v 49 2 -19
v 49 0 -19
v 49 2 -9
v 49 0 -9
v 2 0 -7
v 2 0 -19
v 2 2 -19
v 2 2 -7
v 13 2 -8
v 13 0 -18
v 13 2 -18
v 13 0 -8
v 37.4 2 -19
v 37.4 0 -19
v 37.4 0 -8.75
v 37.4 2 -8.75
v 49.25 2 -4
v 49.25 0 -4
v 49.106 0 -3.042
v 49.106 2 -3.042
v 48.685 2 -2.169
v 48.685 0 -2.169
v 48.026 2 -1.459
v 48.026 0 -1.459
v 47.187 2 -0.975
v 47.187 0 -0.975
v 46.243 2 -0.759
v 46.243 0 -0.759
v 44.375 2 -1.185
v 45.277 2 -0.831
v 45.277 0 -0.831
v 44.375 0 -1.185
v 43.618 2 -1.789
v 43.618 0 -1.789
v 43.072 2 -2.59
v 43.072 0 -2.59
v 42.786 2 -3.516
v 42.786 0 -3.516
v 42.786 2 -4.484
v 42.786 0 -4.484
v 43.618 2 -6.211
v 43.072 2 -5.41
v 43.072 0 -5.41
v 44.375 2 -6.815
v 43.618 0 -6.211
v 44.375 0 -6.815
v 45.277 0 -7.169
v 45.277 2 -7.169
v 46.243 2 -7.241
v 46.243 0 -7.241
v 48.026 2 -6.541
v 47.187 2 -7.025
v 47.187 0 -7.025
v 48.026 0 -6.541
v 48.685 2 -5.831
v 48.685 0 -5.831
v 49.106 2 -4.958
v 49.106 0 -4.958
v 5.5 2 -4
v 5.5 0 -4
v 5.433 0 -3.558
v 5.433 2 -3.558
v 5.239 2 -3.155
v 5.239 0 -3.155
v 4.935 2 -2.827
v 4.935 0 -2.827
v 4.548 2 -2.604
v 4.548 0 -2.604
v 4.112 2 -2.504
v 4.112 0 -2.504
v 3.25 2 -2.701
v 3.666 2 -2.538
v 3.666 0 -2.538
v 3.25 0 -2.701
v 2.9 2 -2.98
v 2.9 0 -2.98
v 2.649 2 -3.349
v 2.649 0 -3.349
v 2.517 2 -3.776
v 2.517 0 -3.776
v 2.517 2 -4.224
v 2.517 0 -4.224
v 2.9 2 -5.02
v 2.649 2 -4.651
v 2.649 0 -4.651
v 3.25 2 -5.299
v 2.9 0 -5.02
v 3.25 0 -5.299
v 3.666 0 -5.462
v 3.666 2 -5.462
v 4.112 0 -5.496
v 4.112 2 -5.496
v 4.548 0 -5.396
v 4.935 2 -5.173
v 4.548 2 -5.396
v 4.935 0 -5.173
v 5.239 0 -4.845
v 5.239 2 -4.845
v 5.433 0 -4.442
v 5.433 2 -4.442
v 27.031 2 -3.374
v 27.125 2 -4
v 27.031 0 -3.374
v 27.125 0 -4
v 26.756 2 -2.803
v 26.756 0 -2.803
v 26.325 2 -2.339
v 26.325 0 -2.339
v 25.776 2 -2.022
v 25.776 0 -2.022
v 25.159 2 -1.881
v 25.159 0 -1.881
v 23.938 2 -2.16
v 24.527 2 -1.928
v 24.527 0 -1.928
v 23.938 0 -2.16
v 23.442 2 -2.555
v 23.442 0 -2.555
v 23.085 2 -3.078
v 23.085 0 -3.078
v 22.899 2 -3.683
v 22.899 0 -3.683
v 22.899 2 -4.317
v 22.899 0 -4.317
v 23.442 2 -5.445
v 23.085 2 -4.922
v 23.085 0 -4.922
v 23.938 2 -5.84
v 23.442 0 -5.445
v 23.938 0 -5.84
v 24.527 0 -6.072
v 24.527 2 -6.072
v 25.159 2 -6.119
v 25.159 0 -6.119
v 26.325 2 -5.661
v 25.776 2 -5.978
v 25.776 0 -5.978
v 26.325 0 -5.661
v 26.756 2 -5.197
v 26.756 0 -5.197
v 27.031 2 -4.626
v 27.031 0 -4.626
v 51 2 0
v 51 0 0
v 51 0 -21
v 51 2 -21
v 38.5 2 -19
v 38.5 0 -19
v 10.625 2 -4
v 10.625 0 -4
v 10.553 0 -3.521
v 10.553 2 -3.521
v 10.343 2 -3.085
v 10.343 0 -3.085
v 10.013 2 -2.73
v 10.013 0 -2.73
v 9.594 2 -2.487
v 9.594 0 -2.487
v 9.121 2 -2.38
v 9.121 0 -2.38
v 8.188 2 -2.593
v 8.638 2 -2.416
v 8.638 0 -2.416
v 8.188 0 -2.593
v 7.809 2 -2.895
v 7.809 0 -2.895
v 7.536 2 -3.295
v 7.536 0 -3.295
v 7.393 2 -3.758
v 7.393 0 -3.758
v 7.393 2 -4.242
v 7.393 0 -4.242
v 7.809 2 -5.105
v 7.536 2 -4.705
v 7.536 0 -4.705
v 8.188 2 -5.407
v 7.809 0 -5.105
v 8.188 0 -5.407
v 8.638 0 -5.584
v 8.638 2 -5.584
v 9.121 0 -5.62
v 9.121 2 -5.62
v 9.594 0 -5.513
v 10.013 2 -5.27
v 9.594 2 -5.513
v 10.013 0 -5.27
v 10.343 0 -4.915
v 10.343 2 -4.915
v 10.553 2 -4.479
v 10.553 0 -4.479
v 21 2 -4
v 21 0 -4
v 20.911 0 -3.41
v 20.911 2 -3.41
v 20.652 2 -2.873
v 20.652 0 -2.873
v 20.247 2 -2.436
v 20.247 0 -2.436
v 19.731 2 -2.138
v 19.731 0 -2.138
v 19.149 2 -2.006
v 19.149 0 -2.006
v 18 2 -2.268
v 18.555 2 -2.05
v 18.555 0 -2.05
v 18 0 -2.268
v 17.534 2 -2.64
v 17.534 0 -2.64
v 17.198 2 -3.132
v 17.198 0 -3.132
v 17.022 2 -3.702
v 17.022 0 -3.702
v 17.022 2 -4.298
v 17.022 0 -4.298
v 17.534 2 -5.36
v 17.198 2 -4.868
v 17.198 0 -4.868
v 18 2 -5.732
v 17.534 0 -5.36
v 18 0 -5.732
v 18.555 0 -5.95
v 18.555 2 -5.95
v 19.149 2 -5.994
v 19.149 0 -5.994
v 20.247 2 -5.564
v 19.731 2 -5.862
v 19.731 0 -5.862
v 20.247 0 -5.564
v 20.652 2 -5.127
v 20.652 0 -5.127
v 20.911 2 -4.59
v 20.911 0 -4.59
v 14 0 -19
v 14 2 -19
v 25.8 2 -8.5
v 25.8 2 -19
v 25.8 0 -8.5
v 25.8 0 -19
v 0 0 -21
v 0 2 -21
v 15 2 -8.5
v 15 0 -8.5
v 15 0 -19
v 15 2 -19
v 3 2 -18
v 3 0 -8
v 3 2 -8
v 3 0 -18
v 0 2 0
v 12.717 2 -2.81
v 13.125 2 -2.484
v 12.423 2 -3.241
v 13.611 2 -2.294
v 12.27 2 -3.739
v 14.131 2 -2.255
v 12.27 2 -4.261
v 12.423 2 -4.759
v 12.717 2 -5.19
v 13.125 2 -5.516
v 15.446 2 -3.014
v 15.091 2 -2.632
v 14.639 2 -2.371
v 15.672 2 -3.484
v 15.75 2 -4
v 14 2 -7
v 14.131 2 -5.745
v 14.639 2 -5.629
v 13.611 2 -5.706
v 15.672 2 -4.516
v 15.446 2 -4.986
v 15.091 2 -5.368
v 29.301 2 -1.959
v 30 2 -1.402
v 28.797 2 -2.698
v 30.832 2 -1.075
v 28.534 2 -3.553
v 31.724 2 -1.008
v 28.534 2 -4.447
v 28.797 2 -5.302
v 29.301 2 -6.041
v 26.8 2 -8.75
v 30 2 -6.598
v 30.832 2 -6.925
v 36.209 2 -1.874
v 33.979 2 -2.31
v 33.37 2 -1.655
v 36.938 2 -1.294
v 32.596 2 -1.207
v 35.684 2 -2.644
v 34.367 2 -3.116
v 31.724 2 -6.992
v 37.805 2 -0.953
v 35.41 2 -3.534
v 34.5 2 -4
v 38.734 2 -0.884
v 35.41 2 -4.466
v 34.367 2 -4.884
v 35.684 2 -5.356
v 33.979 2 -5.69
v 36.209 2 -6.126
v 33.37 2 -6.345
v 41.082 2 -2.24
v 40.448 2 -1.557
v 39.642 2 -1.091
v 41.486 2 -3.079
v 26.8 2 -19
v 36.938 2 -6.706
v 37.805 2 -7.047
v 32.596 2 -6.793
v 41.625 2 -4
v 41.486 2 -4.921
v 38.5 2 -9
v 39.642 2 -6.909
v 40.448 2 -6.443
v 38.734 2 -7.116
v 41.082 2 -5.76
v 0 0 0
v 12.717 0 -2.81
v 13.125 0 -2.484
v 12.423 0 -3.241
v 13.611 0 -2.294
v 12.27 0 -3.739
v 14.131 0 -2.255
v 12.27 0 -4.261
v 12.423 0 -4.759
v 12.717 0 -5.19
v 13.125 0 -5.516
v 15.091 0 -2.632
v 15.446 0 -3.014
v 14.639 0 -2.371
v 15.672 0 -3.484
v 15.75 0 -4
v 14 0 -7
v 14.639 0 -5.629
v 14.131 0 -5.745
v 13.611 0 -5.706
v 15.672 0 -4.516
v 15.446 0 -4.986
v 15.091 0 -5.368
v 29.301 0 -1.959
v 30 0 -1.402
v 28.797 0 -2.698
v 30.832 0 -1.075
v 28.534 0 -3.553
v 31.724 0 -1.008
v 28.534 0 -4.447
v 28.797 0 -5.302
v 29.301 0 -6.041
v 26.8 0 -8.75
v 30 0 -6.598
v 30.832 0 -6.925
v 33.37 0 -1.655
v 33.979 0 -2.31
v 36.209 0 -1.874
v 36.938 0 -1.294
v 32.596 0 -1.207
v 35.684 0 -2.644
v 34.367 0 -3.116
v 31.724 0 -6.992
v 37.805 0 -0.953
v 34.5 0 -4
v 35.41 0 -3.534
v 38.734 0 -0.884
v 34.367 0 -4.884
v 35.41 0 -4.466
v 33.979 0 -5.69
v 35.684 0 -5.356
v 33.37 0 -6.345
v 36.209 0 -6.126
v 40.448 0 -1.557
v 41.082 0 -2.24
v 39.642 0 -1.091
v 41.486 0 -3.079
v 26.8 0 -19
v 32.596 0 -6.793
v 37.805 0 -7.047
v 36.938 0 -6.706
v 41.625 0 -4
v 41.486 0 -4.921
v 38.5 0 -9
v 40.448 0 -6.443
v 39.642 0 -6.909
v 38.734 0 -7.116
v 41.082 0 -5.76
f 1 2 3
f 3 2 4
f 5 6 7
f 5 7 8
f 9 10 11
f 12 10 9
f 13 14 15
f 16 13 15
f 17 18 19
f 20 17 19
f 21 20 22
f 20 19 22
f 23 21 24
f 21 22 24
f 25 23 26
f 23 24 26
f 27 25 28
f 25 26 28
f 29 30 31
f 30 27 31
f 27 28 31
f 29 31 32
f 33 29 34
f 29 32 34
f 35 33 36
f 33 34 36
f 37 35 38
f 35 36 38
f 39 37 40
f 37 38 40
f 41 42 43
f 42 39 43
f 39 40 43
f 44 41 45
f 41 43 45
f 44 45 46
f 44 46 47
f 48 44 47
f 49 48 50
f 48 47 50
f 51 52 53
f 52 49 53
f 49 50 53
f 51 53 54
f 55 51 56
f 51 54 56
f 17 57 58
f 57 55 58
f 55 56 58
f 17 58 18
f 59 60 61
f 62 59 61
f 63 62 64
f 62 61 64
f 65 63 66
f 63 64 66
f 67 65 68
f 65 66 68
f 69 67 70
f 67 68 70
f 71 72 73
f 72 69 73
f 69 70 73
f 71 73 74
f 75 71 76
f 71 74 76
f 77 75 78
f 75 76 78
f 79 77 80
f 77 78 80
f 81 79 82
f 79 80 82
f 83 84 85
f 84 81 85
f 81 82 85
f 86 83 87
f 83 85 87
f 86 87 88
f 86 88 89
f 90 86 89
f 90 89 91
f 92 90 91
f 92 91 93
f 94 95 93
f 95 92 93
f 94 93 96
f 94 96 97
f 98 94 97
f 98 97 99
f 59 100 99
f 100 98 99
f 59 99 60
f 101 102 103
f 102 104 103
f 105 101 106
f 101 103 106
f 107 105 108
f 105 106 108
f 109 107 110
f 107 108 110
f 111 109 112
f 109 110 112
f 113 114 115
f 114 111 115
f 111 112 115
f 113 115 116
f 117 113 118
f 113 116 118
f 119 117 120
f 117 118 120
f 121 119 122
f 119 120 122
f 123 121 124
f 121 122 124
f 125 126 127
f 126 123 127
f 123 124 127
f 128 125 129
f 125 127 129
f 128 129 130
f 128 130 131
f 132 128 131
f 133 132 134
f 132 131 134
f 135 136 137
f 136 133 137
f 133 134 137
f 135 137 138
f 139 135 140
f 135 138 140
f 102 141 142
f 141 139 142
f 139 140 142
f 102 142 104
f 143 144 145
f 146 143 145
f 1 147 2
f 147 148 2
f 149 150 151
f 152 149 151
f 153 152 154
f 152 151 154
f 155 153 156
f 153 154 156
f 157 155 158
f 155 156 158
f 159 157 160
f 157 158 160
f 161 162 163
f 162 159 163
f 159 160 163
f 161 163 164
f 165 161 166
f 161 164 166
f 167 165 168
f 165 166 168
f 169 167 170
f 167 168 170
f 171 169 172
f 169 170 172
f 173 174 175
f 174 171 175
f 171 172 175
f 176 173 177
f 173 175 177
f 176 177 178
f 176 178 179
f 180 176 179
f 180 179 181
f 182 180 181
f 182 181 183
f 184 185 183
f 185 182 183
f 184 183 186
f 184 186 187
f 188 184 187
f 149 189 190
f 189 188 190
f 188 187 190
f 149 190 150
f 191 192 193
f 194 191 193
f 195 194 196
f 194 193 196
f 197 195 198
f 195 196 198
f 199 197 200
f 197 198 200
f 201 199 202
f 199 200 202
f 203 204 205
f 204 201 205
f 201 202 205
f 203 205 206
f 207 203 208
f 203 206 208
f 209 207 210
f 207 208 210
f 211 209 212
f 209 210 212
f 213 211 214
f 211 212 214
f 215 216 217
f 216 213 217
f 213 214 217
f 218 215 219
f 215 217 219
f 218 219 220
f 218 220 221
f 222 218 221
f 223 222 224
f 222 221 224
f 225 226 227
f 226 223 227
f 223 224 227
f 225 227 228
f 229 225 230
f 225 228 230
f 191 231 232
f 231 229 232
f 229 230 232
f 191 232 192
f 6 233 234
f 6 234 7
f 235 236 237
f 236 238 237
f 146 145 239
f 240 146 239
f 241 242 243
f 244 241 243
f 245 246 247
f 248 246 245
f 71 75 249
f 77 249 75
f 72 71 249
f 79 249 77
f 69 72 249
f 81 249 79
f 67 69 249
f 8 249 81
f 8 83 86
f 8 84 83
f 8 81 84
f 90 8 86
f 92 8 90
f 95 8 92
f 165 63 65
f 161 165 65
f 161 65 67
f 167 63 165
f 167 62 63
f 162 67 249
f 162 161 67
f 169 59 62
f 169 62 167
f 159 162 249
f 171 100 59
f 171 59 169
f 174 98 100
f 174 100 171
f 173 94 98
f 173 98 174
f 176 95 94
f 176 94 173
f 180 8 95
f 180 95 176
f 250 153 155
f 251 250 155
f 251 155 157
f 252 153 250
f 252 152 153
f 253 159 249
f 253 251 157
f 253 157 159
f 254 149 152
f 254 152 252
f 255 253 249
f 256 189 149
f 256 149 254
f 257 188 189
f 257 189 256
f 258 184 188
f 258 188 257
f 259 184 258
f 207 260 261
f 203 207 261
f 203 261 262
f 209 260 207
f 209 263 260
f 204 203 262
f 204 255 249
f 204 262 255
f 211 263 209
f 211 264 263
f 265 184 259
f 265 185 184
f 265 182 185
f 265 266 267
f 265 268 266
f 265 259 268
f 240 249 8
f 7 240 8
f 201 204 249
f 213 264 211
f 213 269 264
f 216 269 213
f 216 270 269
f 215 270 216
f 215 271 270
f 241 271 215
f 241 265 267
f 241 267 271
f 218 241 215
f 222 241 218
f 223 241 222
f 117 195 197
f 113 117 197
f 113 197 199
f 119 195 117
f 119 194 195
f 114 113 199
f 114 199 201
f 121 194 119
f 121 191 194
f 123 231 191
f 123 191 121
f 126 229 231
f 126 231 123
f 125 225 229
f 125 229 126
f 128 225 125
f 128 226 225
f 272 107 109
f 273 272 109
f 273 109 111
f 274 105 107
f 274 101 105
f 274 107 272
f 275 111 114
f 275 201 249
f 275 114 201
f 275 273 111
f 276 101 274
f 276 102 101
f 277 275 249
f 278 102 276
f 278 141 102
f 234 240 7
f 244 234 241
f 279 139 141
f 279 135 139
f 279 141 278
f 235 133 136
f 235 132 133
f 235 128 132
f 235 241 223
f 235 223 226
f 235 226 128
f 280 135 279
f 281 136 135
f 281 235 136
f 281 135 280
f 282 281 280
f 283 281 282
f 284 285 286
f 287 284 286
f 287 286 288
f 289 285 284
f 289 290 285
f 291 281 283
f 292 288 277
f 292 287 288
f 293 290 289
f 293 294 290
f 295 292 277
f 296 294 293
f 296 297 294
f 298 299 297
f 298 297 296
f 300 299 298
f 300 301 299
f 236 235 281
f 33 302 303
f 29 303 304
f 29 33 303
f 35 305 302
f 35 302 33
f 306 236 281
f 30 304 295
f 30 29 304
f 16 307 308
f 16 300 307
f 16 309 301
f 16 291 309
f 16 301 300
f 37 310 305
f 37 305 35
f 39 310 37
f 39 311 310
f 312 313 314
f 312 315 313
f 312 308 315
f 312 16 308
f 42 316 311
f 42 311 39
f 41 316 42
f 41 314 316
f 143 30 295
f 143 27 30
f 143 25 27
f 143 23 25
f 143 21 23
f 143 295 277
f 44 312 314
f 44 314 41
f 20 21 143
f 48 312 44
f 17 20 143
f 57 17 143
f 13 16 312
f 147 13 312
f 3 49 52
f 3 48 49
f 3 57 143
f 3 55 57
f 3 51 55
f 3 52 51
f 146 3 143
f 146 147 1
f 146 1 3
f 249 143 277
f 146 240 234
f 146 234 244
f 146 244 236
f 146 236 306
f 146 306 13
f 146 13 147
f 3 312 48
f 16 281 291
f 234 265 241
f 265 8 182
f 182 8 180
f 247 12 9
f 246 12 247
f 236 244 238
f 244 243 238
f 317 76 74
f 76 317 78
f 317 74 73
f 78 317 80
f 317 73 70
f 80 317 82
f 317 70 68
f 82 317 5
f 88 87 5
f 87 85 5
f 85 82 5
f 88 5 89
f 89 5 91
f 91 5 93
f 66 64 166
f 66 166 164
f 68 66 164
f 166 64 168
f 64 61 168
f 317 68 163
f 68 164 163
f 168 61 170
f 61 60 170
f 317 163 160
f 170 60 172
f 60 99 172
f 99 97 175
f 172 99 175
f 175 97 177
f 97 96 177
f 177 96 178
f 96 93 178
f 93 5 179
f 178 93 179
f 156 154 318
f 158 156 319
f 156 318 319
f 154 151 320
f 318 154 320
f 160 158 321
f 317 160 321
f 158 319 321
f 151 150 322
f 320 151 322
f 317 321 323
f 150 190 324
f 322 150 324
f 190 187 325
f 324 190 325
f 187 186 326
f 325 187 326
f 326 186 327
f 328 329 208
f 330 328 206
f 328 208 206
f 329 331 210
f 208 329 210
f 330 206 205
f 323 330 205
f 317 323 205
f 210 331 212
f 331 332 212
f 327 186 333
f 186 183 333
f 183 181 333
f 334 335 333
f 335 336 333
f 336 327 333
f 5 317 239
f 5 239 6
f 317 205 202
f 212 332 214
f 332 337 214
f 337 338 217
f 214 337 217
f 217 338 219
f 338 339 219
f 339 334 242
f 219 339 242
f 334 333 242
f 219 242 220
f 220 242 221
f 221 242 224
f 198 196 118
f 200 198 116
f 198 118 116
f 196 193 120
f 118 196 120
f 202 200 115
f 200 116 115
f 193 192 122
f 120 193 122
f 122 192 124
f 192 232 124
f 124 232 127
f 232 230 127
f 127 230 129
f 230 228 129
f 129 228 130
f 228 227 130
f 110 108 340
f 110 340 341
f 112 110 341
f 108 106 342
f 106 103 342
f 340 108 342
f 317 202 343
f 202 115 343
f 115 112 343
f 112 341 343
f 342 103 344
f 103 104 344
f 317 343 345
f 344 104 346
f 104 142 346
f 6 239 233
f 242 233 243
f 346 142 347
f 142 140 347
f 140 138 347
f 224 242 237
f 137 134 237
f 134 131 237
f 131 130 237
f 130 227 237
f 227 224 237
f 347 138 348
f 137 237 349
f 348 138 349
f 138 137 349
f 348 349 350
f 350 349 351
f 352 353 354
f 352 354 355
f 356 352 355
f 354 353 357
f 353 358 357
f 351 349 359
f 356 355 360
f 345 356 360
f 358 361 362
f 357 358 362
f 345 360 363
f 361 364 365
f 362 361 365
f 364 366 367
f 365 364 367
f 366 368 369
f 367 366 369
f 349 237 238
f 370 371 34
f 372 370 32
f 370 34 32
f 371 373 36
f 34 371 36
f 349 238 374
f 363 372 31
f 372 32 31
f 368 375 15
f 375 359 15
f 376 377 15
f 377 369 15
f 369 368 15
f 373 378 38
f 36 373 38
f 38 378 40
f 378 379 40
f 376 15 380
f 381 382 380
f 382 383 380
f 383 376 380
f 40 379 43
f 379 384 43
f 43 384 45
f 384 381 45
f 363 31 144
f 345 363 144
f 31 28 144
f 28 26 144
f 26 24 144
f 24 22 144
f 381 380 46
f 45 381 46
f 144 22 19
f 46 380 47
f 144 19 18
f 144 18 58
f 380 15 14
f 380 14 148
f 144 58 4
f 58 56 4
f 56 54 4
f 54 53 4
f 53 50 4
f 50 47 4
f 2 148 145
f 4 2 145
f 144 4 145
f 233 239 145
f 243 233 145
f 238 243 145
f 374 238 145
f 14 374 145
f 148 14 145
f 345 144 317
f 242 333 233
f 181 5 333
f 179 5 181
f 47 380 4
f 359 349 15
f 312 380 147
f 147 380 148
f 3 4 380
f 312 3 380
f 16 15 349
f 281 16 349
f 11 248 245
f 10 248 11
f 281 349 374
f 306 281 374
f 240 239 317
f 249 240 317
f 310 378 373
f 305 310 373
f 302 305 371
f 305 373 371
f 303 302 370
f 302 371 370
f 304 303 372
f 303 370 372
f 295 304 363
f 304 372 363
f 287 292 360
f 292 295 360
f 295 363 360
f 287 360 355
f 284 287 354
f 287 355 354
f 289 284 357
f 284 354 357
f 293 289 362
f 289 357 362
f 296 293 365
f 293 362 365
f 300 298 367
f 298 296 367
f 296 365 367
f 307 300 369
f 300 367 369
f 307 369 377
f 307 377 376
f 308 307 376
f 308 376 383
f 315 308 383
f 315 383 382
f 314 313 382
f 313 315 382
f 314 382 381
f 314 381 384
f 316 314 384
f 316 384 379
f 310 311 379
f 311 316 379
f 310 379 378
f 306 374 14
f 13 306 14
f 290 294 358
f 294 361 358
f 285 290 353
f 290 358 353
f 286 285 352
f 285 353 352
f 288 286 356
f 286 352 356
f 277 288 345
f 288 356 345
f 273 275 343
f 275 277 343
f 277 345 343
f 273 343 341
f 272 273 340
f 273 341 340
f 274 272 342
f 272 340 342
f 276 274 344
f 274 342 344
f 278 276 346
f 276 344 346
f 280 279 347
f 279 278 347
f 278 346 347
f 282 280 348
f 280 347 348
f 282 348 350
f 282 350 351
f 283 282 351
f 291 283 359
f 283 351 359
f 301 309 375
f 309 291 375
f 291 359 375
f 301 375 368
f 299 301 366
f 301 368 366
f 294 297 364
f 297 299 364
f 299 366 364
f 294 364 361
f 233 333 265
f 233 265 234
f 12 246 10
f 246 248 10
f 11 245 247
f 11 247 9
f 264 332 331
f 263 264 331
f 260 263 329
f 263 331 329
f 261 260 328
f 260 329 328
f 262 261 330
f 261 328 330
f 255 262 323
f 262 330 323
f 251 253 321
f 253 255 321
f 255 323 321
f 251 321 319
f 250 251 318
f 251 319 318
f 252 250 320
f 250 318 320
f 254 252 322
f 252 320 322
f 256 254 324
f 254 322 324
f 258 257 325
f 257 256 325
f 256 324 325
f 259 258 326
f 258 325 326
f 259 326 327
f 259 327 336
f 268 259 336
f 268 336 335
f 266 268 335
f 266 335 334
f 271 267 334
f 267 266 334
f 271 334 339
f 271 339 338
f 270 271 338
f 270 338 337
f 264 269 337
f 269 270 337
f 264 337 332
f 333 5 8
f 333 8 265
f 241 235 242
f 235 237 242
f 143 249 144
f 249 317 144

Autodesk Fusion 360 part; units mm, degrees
sketch "Sketch1" plane through (0, 0, 0) normal (0, 1, 0) x (1, 0, 0)
  line L0 (51, 21) -> (0, 21)
  line L1 (0, 21) -> (0, 0)
  circle A0 centre (4, 4) radius 1.5
  circle A1 centre (9, 4) radius 1.625
  circle A2 centre (14, 4) radius 1.75
  circle A3 centre (19, 4) radius 2
  circle A4 centre (25, 4) radius 2.125
  line L2 (38.5, 19) -> (49, 19)
  line L3 (49, 19) -> (49, 9)
  line L4 (49, 9) -> (38.5, 9)
  line L5 (38.5, 9) -> (38.5, 19)
  line L6 (26.8, 19) -> (37.4, 19)
  line L7 (37.4, 19) -> (37.4, 8.75)
  line L8 (37.4, 8.75) -> (26.8, 8.75)
  line L9 (26.8, 8.75) -> (26.8, 19)
  line L10 (15, 19) -> (25.8, 19)
  line L11 (25.8, 19) -> (25.8, 8.5)
  line L12 (25.8, 8.5) -> (15, 8.5)
  line L13 (15, 8.5) -> (15, 19)
  line L14 (3, 18) -> (13, 18)
  line L15 (13, 18) -> (13, 8)
  line L16 (13, 8) -> (3, 8)
  line L17 (3, 8) -> (3, 18)
  line L18 (2, 7) -> (14, 7)
  line L19 (14, 7) -> (14, 19)
  line L20 (14, 19) -> (2, 19)
  line L21 (2, 19) -> (2, 7)
  circle A5 centre (31.5, 4) radius 3
  line L22 (0, 0) -> (51, 0)
  line L23 (51, 0) -> (51, 8)
  line L24 (51, 8) -> (51, 21)
  line L25 (2, 19) -> (14, 7) construction
  line L26 (13, 18) -> (3, 8) construction
  line L27 (0, 4) -> (51, 4) construction
  circle A6 centre (38.5, 4) radius 3.125
  circle A7 centre (46, 4) radius 3.25
  point P0 (8, 13)
  point P1 (8, 13)
  dimension "d1" = 3
  dimension "d2" = 3.25
  dimension "d3" = 3.5
  dimension "d4" = 4
  dimension "d5" = 4.25
  dimension "d6" = 10.25
  dimension "d7" = 10.5
  dimension "d8" = 10
  dimension "d9" = 10
  dimension "d10" = 12
  dimension "d11" = 12
  dimension "d12" = 6
  dimension "d13" = 10.8
  dimension "d14" = 10.6
  dimension "d15" = 10.5
  dimension "d16" = 10
  dimension "d17" = 2
  dimension "d18" = 2
  dimension "d19" = 2
  dimension "d20" = 13
  dimension "d21" = 51
  dimension "d22" = 21
  dimension "d23" = 1
  dimension "d24" = 1
  dimension "d25" = 1.1
  dimension "d26" = 4
  dimension "d27" = 9
  dimension "d28" = 14
  dimension "d29" = 19
  dimension "d30" = 25
  dimension "d31" = 31.5
  dimension "d32" = 6.25
  dimension "d33" = 6.5
  dimension "d34" = 38.5
  dimension "d35" = 46
extrude "Extrude1" add sketch "Sketch1" along normal blind 2 makes body 1 at (20.0817, 0, -7.65) makes body 2 at (6.3333, 0, -14.6667)
